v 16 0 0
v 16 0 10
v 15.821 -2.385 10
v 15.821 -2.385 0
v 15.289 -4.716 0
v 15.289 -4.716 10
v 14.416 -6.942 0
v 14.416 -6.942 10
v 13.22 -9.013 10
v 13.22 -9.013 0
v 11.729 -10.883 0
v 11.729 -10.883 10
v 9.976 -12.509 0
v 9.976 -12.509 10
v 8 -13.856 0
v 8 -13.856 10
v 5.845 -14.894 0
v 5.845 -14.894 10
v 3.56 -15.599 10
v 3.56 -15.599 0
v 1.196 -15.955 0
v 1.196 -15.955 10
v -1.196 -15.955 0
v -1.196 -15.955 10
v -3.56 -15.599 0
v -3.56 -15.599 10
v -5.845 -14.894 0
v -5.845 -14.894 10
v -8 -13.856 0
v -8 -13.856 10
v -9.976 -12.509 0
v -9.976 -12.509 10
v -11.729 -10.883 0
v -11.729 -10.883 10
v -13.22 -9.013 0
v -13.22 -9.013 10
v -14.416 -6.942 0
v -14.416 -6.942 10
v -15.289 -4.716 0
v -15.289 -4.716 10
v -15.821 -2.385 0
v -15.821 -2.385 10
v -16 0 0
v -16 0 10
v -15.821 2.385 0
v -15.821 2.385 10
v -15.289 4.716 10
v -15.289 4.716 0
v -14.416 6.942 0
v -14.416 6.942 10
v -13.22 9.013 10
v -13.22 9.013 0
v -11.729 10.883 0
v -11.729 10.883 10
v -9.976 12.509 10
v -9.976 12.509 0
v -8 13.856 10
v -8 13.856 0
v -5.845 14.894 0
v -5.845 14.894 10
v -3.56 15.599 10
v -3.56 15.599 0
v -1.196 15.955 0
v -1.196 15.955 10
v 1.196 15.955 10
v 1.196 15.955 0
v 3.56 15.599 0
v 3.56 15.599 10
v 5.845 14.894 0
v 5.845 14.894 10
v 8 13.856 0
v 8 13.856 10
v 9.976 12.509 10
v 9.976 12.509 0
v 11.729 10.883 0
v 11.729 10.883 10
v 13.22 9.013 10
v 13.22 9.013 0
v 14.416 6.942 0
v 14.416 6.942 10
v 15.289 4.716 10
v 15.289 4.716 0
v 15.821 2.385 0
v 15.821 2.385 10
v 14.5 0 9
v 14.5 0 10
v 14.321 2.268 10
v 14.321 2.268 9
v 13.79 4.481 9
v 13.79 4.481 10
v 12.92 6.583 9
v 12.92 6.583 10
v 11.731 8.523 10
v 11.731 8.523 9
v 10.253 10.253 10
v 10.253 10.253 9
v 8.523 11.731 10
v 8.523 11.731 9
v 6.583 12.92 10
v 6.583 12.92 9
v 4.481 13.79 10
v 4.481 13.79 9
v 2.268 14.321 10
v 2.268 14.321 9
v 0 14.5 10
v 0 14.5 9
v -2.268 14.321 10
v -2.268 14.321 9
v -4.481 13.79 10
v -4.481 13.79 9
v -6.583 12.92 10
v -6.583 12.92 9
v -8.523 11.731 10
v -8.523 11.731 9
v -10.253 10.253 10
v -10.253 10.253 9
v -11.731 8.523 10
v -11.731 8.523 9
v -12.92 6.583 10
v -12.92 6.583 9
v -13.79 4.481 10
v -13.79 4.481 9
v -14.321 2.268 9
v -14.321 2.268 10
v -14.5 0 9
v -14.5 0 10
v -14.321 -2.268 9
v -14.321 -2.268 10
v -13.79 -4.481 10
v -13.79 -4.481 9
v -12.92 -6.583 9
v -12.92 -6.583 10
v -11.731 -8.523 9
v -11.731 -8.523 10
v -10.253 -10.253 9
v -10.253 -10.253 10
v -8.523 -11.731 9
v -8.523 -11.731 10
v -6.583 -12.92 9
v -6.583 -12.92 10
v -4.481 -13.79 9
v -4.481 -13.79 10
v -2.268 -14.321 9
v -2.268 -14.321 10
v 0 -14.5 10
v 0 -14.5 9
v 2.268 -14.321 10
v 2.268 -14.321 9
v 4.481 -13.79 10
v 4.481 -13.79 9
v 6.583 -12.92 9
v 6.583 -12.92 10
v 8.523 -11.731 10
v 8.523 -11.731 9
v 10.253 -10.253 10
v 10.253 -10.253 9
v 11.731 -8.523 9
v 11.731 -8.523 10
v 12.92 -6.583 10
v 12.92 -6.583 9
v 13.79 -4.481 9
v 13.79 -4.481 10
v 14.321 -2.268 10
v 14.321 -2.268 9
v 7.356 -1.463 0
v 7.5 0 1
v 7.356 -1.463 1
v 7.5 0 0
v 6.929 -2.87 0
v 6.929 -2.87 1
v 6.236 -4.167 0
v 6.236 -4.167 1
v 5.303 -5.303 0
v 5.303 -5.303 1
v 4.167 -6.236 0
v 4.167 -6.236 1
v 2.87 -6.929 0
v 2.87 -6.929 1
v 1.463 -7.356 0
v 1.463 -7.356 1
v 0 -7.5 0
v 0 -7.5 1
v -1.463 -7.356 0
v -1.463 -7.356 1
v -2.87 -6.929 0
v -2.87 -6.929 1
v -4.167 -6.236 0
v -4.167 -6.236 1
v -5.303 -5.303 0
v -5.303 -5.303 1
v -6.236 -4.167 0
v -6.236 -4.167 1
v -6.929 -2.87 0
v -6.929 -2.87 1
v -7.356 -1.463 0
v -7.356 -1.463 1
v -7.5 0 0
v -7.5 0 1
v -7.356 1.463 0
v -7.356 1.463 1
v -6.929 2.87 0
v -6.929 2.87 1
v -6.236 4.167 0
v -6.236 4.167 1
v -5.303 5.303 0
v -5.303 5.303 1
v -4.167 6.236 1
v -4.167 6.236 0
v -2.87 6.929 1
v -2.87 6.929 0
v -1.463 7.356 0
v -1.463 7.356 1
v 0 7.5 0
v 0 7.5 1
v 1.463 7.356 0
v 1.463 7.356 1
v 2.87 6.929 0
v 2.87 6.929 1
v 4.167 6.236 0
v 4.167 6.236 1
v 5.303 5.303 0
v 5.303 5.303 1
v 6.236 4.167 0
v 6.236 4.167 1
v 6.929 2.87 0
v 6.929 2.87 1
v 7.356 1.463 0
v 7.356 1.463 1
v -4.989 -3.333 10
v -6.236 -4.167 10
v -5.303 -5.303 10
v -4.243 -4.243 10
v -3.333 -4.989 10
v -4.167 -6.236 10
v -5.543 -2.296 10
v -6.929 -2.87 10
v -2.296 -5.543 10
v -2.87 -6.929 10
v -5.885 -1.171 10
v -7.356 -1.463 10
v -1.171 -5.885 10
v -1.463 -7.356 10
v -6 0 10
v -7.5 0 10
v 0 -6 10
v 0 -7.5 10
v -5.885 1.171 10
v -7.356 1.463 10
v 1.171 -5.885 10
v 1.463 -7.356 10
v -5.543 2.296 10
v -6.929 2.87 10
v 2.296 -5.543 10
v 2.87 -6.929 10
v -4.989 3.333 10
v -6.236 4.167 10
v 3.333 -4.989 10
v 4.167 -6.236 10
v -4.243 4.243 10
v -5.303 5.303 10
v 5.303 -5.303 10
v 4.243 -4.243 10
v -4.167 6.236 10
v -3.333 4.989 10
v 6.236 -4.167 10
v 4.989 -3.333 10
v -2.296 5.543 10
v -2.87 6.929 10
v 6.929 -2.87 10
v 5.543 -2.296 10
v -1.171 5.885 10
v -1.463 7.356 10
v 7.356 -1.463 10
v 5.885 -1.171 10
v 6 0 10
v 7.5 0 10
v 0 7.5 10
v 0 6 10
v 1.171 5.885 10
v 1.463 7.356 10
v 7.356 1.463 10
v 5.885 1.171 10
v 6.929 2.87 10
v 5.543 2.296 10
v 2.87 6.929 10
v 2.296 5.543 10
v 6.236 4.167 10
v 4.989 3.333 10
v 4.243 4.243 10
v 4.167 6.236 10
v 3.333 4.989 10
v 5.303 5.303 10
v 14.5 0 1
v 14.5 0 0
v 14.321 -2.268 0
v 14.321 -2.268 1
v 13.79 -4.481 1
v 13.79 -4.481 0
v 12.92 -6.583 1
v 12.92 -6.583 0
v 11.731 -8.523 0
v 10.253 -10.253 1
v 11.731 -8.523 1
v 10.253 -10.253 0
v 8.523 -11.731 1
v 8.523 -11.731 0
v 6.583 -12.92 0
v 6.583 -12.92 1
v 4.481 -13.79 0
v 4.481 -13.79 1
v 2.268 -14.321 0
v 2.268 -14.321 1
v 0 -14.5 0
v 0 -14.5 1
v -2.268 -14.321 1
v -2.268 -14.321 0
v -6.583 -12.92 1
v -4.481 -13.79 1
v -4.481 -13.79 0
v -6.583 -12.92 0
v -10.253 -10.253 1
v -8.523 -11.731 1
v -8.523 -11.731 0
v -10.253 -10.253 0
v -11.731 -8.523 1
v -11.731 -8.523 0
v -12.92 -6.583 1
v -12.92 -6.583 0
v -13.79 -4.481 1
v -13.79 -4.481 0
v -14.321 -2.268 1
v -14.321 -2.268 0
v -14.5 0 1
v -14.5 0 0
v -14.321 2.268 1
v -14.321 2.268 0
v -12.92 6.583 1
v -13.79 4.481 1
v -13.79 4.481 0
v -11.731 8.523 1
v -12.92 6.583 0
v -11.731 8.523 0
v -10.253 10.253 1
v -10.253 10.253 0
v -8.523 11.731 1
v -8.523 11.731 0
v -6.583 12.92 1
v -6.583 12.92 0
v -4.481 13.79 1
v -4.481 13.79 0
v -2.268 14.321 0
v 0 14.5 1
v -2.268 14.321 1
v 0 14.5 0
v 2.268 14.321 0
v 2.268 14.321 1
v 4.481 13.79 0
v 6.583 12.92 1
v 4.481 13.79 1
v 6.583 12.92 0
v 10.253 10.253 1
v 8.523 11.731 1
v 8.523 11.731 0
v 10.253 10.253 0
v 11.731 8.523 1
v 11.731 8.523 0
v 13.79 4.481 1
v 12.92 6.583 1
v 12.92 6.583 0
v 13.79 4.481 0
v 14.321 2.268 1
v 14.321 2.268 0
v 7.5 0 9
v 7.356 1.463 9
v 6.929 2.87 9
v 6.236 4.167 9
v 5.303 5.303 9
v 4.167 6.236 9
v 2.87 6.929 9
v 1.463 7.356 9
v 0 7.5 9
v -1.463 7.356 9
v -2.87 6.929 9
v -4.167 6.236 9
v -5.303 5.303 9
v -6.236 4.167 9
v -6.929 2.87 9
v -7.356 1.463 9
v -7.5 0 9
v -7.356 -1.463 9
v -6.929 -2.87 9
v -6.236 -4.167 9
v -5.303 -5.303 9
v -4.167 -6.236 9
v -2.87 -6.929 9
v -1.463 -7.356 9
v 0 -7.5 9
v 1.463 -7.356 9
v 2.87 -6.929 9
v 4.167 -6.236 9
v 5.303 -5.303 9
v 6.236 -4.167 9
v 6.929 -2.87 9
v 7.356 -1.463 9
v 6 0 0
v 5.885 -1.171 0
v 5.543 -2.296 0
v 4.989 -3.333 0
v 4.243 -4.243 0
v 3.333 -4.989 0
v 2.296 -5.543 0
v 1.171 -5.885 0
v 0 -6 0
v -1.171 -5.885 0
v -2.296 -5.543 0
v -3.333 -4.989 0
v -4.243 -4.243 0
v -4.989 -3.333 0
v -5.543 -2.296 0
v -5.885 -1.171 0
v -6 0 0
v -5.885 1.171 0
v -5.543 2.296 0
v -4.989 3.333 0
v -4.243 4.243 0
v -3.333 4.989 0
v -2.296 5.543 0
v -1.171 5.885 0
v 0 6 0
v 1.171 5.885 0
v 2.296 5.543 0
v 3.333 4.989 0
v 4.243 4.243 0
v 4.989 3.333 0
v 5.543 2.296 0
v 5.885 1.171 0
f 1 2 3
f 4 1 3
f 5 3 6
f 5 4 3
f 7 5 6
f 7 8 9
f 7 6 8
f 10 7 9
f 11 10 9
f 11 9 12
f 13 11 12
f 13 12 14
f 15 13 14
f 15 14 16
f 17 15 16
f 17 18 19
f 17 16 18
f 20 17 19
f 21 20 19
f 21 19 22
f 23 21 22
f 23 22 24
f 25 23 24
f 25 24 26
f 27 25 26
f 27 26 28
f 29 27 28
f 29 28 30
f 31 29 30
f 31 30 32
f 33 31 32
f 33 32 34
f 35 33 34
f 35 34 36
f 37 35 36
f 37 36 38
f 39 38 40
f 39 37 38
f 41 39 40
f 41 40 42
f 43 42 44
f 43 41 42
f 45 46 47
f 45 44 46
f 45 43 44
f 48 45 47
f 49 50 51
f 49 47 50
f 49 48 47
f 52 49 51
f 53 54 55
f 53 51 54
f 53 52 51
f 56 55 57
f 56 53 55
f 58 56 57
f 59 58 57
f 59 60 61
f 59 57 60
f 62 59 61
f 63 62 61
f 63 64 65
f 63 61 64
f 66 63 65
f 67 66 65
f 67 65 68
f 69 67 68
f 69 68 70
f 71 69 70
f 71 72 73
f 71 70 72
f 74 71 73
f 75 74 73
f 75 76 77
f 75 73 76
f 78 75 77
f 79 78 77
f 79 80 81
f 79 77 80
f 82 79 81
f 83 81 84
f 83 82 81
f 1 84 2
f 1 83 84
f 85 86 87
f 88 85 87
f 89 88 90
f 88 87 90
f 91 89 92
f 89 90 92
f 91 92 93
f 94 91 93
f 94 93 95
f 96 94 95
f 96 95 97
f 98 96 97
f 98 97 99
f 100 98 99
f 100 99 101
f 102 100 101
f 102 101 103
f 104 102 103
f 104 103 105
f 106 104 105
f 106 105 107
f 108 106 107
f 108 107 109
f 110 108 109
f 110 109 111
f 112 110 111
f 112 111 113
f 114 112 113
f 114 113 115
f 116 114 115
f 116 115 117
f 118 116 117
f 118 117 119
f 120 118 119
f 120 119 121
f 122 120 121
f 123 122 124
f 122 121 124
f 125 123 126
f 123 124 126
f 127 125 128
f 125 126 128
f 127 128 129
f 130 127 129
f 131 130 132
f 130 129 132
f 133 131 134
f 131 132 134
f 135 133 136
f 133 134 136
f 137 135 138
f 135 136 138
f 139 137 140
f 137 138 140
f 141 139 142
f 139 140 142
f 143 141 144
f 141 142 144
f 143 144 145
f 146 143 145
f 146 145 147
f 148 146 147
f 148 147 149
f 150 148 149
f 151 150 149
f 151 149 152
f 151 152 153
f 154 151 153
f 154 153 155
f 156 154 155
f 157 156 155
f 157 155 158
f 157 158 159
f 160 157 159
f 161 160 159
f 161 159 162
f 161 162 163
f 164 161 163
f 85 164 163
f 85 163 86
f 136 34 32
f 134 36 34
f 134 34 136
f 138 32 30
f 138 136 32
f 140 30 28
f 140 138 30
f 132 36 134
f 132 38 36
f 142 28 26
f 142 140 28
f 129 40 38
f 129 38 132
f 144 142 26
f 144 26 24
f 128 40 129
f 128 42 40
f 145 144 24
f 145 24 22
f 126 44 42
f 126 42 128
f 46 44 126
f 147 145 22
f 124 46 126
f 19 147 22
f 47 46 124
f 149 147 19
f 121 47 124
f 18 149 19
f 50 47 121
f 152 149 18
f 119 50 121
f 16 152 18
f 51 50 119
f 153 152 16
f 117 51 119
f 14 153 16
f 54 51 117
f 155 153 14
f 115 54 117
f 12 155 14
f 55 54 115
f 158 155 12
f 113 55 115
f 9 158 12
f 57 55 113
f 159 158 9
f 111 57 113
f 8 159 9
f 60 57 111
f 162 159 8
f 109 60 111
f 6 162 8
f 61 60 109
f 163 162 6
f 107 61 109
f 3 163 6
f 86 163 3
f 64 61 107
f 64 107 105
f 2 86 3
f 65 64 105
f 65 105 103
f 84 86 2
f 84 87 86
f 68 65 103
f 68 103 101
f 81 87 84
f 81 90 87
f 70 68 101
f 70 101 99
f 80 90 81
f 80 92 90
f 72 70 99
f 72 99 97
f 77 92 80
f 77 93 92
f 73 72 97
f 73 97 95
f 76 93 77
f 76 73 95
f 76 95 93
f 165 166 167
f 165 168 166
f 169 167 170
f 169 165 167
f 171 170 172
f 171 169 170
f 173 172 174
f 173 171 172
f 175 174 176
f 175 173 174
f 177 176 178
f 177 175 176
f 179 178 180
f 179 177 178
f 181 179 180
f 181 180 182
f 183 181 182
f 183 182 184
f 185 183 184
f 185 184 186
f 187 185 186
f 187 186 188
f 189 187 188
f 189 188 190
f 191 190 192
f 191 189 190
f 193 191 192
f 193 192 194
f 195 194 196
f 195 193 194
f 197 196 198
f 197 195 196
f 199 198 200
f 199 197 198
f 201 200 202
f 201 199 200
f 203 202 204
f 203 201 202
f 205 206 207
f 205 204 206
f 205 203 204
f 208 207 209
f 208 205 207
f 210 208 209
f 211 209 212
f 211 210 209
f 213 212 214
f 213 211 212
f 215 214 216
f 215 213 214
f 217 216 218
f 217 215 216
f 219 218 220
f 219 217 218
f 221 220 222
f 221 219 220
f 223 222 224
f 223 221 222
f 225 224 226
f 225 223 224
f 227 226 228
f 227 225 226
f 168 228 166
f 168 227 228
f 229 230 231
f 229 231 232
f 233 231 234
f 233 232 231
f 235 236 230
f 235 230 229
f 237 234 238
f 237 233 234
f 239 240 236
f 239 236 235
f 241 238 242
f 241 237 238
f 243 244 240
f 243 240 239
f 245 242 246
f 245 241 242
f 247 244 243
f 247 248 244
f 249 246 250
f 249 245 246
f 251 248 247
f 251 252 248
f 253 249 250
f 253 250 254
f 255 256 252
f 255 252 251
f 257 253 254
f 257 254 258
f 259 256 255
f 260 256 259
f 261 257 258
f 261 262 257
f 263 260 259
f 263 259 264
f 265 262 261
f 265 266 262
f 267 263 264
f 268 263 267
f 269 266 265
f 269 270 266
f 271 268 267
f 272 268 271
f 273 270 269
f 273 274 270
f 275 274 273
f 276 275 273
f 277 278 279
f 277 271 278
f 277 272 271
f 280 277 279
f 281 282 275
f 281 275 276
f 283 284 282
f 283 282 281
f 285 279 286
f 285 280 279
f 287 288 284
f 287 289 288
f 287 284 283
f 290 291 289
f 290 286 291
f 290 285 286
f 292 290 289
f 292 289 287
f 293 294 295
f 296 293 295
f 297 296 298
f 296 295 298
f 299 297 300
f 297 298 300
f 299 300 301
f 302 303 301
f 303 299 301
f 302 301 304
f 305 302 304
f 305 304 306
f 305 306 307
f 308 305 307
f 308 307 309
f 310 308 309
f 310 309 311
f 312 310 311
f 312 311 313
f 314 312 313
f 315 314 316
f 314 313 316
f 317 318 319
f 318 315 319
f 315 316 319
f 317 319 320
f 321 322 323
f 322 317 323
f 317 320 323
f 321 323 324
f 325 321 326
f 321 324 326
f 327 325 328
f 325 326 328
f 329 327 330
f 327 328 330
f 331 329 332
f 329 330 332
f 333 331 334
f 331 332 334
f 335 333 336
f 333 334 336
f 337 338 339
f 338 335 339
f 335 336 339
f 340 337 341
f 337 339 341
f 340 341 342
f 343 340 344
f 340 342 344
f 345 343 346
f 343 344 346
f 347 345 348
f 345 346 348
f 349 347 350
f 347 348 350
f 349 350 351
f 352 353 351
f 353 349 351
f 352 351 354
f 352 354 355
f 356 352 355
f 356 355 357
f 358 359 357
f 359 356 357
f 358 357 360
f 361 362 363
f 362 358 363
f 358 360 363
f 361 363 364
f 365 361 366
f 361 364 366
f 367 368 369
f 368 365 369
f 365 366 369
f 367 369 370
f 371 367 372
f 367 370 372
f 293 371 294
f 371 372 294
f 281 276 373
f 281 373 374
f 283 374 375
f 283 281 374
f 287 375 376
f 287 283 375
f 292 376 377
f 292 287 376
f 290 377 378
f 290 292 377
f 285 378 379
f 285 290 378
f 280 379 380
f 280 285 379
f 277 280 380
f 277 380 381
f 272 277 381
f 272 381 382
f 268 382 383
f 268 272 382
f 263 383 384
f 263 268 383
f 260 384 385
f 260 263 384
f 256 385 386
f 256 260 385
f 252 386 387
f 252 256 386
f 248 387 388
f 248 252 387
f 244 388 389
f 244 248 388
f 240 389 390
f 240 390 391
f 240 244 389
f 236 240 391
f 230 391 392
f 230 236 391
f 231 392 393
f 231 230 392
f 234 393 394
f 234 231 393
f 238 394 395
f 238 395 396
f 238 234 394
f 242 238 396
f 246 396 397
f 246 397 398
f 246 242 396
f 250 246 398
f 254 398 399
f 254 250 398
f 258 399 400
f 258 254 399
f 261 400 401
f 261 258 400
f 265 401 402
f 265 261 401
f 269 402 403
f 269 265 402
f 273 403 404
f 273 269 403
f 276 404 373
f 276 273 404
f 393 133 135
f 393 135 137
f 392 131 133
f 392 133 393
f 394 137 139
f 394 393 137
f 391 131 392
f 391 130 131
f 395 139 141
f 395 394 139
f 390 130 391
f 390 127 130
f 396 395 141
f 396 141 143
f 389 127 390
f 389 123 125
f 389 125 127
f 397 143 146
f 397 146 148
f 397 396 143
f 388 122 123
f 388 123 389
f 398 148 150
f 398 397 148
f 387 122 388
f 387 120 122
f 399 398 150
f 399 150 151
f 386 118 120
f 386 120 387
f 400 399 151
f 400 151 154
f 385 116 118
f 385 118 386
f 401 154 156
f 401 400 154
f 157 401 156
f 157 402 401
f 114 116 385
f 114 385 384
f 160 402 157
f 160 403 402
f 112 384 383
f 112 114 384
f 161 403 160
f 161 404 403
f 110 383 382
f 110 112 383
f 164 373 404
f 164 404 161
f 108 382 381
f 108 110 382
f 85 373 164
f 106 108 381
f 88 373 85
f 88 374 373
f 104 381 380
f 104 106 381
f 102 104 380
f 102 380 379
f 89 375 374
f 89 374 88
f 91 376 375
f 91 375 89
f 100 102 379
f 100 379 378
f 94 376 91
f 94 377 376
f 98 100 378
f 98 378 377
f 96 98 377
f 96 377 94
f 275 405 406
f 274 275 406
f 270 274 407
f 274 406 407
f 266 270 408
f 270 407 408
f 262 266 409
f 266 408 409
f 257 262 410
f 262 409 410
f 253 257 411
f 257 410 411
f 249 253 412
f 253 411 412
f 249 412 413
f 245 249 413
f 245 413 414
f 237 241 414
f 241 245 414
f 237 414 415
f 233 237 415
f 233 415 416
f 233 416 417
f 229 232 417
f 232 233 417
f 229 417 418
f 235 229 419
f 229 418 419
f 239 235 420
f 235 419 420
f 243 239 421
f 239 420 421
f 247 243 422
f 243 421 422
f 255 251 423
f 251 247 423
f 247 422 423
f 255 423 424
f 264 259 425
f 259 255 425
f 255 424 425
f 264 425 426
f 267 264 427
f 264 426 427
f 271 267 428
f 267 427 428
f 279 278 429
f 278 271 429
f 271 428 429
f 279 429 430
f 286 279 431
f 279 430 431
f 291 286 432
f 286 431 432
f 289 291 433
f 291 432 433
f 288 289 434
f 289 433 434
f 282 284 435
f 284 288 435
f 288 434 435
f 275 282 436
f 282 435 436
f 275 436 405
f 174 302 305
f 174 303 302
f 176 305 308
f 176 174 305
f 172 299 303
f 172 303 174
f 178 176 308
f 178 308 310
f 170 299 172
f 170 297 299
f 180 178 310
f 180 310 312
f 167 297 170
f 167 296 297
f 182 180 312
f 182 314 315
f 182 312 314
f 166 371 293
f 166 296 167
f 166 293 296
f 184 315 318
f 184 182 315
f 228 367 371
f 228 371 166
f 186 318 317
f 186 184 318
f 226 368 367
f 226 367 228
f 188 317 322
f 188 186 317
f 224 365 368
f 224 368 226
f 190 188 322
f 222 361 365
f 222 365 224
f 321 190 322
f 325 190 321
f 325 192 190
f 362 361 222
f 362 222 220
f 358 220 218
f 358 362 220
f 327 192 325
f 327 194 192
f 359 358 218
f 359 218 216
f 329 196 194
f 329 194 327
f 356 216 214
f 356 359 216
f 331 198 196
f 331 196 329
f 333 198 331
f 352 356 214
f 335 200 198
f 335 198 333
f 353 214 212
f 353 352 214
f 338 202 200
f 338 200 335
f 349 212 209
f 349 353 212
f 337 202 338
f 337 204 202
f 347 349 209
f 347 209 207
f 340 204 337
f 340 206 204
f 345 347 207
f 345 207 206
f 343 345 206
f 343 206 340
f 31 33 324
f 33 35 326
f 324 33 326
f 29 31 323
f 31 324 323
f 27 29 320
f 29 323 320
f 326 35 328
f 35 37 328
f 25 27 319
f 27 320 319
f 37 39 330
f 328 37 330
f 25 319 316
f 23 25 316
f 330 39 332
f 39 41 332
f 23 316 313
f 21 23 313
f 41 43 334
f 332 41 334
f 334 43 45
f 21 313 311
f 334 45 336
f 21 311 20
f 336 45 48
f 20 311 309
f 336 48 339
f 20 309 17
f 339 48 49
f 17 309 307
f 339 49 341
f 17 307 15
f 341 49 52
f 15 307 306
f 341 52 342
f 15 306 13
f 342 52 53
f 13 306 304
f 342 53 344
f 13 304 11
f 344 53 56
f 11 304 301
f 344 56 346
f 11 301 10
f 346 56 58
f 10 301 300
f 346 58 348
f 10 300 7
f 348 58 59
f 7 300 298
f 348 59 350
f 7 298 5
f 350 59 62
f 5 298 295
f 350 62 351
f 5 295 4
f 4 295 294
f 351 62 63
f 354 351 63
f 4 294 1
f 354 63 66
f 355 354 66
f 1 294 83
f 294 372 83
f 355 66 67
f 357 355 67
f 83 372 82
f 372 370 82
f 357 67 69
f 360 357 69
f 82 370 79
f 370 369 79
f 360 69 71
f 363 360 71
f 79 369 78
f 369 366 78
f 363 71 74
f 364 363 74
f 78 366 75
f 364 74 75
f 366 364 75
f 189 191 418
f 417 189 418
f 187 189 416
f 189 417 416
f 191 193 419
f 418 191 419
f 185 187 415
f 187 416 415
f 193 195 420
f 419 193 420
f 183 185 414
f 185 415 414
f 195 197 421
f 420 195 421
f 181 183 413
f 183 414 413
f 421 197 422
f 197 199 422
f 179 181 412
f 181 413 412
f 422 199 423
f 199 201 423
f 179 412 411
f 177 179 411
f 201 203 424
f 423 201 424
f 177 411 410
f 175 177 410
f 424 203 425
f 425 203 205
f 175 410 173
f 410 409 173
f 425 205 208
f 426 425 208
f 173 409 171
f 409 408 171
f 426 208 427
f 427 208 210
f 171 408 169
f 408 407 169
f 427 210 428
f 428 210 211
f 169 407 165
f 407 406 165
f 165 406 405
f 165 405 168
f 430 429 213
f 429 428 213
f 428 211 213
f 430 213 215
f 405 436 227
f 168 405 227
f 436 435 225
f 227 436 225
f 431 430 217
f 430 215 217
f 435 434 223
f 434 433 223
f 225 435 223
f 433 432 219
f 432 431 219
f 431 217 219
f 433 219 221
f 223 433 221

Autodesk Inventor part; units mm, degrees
ref_plane "YZ Plane" through (0, 0, 0) normal (1, 0, 0) x (0, 1, 0)
ref_plane "XZ Plane" through (0, 0, 0) normal (0, 1, 0) x (-1, 0, 0)
sketch "Sketch1" plane through (0, 0, 0) normal (0, 0, 1) x (1, 0, 0)
  circle A0 centre (0, 0) radius 6
  circle A1 centre (0, 0) radius 16
  dimension "d0" = 12
  dimension "d1" = 32
extrude "Extrusion1" add sketch "Sketch1" along normal blind 10
sketch "Sketch2" plane through (0, 0, 10) normal (0, 0, 1) x (1, 0, 0)
  circle A0 centre (0, 0) radius 16 projected
  circle A1 centre (0, 0) radius 6 projected
  circle A2 centre (0, 0) radius 7.5
  circle A3 centre (0, 0) radius 14.5
  dimension "d4" = 1.5
  dimension "d5" = 1.5
extrude "Extrusion2" cut sketch "Sketch2" against normal blind 1 contours A3
ref_plane "Work Plane1" through (0, 0, 5) normal (0, 0, 1) x (1, 0, 0)
mirror "Mirror1" about plane through (0, 0, 5) normal (0, 0, 1) of "Extrusion2"
properties part number "6201 Bearing"
